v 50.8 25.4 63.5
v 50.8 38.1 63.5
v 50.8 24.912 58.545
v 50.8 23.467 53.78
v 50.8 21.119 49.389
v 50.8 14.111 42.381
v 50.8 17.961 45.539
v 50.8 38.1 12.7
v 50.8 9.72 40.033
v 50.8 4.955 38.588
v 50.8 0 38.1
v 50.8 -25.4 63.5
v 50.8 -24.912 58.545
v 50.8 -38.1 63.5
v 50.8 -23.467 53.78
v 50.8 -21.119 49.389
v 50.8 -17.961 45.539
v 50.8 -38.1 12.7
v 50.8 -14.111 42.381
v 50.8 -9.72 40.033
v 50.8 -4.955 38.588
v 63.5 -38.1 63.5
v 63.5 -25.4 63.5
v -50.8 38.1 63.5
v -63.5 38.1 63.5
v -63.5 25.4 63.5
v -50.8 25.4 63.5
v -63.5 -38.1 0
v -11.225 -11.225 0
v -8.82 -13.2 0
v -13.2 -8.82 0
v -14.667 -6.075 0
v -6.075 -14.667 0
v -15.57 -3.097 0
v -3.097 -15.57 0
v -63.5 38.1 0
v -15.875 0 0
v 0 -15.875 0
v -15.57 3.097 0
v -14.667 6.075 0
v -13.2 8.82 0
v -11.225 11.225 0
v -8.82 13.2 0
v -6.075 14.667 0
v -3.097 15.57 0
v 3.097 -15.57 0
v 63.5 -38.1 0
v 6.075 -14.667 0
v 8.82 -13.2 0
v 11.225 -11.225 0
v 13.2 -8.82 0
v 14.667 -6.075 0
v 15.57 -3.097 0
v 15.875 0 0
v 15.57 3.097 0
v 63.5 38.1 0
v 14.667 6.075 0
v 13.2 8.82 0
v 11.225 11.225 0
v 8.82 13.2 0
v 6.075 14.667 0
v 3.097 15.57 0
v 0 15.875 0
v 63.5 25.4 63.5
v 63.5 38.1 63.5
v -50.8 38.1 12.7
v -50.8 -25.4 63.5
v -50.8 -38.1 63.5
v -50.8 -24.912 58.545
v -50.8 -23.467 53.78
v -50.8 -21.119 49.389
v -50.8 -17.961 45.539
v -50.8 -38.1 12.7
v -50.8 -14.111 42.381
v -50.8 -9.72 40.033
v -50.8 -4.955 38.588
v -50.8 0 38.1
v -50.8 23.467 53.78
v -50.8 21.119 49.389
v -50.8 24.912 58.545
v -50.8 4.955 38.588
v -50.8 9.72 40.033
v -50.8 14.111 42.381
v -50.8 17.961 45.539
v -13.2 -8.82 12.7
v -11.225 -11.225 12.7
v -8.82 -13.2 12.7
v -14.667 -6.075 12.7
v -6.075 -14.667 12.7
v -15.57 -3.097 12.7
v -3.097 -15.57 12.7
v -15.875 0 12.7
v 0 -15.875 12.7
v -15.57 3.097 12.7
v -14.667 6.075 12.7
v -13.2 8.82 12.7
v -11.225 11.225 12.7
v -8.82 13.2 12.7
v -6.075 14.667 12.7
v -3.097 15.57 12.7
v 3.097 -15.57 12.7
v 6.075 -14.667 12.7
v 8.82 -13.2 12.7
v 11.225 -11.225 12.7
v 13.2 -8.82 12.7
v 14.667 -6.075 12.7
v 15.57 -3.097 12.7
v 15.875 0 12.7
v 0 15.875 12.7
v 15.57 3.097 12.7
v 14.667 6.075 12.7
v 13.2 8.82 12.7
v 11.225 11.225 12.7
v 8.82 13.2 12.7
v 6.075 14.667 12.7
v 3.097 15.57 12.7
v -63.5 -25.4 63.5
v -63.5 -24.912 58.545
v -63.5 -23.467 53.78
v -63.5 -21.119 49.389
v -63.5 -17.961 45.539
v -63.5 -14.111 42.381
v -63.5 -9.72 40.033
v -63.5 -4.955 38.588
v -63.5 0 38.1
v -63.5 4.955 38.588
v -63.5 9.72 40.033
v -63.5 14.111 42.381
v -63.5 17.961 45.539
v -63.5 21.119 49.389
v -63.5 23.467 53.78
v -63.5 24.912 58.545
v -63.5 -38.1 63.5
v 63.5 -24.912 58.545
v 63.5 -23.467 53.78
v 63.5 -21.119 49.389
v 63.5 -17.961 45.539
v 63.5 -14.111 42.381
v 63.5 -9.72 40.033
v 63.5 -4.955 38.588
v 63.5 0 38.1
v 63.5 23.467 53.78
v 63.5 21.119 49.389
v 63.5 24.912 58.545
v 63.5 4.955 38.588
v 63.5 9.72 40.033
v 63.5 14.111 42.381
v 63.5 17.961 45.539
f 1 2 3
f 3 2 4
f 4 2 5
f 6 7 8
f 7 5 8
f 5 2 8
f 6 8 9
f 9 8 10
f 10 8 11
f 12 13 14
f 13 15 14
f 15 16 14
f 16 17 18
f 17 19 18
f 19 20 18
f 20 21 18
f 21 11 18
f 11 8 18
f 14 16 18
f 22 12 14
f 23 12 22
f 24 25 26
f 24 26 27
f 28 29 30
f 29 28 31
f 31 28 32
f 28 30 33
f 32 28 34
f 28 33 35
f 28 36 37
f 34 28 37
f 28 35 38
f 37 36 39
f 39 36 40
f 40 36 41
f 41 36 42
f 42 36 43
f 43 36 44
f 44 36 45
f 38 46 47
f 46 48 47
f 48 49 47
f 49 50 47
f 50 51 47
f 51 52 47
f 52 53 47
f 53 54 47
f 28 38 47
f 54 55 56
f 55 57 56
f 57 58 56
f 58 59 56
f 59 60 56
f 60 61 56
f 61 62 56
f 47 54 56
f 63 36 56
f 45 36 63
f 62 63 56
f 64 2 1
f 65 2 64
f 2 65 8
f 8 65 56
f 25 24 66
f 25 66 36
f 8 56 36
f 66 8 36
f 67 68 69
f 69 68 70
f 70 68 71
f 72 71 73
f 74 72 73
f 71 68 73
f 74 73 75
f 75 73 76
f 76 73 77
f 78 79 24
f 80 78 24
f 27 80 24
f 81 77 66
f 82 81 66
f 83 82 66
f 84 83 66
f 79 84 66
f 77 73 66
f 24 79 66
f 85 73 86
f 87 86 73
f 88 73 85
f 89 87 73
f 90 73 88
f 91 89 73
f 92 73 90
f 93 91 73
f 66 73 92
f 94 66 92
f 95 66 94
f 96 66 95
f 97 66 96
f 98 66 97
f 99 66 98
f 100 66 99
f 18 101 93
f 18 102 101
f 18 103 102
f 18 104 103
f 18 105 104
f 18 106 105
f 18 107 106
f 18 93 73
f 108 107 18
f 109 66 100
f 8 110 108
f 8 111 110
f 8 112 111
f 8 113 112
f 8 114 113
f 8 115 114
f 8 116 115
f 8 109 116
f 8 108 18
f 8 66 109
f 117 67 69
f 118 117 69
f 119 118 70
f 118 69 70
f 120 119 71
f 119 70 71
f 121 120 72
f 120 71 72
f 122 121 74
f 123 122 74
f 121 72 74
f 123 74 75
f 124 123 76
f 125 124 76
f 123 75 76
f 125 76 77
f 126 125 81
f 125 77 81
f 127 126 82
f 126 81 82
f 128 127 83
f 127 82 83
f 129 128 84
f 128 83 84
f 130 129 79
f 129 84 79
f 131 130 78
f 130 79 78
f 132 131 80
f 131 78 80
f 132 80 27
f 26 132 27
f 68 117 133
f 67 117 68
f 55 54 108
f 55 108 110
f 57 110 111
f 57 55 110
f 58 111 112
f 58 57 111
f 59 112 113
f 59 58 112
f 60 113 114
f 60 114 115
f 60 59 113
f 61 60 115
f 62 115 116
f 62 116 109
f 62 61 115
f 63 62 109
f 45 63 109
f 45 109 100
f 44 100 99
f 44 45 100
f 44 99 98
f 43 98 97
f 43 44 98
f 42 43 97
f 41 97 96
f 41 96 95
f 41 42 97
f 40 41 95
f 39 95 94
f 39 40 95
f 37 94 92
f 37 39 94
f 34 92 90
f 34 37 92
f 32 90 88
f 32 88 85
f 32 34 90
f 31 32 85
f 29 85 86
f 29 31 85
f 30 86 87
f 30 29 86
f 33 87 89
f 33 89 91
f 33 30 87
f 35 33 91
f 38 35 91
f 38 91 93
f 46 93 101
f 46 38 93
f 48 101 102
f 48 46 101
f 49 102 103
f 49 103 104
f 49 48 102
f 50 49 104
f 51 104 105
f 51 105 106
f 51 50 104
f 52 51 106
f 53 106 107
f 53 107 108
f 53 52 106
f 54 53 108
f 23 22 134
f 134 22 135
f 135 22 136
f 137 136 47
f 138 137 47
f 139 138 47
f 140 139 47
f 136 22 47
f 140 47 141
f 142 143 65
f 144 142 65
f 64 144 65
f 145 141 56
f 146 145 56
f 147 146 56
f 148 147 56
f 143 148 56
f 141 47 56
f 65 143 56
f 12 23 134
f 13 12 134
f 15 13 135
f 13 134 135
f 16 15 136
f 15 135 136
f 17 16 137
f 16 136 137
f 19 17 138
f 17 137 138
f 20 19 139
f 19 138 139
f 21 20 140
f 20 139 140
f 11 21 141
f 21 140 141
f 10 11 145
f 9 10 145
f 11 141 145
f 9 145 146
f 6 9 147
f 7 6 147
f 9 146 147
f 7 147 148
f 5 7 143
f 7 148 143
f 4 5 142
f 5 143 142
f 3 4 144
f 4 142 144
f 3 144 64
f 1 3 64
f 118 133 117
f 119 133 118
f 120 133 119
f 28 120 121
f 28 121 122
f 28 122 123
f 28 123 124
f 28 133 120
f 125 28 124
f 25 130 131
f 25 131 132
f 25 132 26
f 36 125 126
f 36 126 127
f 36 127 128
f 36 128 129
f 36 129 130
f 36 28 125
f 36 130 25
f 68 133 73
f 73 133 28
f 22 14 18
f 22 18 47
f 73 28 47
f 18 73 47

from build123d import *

# Parameters (mm, degrees)
F0_R     = 15.875
F0_W     = 12.7
F0_H     = 76.2
F1_DEPTH = 12.7
F2_DEPTH = 63.5
F4_DEPTH = 127.001


with BuildPart() as f1:
    # F0 (on Top) → F1 (new body)
    with BuildSketch(Plane.XY):
        Polygon((50.8, -38.1), (50.8, 38.1), (-50.8, 38.1), (-50.8, -38.1), (0, -38.1), align=None)
        Circle(F0_R, mode=Mode.SUBTRACT)
        with Locations((-57.15, 0)):
            Rectangle(F0_W, F0_H)
        Polygon((63.5, 0), (63.5, 38.1), (50.8, 38.1), (50.8, -38.1), (63.5, -38.1), align=None)
    extrude(amount=F1_DEPTH)

    # F0 (on Top) → F2 (join)
    with BuildSketch(Plane.XY):
        with Locations((-57.15, 0)):
            Rectangle(F0_W, F0_H)
        Polygon((63.5, 0), (63.5, 38.1), (50.8, 38.1), (50.8, -38.1), (63.5, -38.1), align=None)
    extrude(amount=F2_DEPTH)

    # F3 (on face) → F4 (cut, through all)
    with BuildSketch(Plane.YZ.offset(63.5)):
        with BuildLine():
            ThreePointArc((-25.4, 63.5), (0, 38.1), (25.4, 63.5))
            Line((25.4, 63.5), (-25.4, 63.5))
        make_face()
    extrude(amount=-F4_DEPTH, mode=Mode.SUBTRACT)


solid = f1.part
